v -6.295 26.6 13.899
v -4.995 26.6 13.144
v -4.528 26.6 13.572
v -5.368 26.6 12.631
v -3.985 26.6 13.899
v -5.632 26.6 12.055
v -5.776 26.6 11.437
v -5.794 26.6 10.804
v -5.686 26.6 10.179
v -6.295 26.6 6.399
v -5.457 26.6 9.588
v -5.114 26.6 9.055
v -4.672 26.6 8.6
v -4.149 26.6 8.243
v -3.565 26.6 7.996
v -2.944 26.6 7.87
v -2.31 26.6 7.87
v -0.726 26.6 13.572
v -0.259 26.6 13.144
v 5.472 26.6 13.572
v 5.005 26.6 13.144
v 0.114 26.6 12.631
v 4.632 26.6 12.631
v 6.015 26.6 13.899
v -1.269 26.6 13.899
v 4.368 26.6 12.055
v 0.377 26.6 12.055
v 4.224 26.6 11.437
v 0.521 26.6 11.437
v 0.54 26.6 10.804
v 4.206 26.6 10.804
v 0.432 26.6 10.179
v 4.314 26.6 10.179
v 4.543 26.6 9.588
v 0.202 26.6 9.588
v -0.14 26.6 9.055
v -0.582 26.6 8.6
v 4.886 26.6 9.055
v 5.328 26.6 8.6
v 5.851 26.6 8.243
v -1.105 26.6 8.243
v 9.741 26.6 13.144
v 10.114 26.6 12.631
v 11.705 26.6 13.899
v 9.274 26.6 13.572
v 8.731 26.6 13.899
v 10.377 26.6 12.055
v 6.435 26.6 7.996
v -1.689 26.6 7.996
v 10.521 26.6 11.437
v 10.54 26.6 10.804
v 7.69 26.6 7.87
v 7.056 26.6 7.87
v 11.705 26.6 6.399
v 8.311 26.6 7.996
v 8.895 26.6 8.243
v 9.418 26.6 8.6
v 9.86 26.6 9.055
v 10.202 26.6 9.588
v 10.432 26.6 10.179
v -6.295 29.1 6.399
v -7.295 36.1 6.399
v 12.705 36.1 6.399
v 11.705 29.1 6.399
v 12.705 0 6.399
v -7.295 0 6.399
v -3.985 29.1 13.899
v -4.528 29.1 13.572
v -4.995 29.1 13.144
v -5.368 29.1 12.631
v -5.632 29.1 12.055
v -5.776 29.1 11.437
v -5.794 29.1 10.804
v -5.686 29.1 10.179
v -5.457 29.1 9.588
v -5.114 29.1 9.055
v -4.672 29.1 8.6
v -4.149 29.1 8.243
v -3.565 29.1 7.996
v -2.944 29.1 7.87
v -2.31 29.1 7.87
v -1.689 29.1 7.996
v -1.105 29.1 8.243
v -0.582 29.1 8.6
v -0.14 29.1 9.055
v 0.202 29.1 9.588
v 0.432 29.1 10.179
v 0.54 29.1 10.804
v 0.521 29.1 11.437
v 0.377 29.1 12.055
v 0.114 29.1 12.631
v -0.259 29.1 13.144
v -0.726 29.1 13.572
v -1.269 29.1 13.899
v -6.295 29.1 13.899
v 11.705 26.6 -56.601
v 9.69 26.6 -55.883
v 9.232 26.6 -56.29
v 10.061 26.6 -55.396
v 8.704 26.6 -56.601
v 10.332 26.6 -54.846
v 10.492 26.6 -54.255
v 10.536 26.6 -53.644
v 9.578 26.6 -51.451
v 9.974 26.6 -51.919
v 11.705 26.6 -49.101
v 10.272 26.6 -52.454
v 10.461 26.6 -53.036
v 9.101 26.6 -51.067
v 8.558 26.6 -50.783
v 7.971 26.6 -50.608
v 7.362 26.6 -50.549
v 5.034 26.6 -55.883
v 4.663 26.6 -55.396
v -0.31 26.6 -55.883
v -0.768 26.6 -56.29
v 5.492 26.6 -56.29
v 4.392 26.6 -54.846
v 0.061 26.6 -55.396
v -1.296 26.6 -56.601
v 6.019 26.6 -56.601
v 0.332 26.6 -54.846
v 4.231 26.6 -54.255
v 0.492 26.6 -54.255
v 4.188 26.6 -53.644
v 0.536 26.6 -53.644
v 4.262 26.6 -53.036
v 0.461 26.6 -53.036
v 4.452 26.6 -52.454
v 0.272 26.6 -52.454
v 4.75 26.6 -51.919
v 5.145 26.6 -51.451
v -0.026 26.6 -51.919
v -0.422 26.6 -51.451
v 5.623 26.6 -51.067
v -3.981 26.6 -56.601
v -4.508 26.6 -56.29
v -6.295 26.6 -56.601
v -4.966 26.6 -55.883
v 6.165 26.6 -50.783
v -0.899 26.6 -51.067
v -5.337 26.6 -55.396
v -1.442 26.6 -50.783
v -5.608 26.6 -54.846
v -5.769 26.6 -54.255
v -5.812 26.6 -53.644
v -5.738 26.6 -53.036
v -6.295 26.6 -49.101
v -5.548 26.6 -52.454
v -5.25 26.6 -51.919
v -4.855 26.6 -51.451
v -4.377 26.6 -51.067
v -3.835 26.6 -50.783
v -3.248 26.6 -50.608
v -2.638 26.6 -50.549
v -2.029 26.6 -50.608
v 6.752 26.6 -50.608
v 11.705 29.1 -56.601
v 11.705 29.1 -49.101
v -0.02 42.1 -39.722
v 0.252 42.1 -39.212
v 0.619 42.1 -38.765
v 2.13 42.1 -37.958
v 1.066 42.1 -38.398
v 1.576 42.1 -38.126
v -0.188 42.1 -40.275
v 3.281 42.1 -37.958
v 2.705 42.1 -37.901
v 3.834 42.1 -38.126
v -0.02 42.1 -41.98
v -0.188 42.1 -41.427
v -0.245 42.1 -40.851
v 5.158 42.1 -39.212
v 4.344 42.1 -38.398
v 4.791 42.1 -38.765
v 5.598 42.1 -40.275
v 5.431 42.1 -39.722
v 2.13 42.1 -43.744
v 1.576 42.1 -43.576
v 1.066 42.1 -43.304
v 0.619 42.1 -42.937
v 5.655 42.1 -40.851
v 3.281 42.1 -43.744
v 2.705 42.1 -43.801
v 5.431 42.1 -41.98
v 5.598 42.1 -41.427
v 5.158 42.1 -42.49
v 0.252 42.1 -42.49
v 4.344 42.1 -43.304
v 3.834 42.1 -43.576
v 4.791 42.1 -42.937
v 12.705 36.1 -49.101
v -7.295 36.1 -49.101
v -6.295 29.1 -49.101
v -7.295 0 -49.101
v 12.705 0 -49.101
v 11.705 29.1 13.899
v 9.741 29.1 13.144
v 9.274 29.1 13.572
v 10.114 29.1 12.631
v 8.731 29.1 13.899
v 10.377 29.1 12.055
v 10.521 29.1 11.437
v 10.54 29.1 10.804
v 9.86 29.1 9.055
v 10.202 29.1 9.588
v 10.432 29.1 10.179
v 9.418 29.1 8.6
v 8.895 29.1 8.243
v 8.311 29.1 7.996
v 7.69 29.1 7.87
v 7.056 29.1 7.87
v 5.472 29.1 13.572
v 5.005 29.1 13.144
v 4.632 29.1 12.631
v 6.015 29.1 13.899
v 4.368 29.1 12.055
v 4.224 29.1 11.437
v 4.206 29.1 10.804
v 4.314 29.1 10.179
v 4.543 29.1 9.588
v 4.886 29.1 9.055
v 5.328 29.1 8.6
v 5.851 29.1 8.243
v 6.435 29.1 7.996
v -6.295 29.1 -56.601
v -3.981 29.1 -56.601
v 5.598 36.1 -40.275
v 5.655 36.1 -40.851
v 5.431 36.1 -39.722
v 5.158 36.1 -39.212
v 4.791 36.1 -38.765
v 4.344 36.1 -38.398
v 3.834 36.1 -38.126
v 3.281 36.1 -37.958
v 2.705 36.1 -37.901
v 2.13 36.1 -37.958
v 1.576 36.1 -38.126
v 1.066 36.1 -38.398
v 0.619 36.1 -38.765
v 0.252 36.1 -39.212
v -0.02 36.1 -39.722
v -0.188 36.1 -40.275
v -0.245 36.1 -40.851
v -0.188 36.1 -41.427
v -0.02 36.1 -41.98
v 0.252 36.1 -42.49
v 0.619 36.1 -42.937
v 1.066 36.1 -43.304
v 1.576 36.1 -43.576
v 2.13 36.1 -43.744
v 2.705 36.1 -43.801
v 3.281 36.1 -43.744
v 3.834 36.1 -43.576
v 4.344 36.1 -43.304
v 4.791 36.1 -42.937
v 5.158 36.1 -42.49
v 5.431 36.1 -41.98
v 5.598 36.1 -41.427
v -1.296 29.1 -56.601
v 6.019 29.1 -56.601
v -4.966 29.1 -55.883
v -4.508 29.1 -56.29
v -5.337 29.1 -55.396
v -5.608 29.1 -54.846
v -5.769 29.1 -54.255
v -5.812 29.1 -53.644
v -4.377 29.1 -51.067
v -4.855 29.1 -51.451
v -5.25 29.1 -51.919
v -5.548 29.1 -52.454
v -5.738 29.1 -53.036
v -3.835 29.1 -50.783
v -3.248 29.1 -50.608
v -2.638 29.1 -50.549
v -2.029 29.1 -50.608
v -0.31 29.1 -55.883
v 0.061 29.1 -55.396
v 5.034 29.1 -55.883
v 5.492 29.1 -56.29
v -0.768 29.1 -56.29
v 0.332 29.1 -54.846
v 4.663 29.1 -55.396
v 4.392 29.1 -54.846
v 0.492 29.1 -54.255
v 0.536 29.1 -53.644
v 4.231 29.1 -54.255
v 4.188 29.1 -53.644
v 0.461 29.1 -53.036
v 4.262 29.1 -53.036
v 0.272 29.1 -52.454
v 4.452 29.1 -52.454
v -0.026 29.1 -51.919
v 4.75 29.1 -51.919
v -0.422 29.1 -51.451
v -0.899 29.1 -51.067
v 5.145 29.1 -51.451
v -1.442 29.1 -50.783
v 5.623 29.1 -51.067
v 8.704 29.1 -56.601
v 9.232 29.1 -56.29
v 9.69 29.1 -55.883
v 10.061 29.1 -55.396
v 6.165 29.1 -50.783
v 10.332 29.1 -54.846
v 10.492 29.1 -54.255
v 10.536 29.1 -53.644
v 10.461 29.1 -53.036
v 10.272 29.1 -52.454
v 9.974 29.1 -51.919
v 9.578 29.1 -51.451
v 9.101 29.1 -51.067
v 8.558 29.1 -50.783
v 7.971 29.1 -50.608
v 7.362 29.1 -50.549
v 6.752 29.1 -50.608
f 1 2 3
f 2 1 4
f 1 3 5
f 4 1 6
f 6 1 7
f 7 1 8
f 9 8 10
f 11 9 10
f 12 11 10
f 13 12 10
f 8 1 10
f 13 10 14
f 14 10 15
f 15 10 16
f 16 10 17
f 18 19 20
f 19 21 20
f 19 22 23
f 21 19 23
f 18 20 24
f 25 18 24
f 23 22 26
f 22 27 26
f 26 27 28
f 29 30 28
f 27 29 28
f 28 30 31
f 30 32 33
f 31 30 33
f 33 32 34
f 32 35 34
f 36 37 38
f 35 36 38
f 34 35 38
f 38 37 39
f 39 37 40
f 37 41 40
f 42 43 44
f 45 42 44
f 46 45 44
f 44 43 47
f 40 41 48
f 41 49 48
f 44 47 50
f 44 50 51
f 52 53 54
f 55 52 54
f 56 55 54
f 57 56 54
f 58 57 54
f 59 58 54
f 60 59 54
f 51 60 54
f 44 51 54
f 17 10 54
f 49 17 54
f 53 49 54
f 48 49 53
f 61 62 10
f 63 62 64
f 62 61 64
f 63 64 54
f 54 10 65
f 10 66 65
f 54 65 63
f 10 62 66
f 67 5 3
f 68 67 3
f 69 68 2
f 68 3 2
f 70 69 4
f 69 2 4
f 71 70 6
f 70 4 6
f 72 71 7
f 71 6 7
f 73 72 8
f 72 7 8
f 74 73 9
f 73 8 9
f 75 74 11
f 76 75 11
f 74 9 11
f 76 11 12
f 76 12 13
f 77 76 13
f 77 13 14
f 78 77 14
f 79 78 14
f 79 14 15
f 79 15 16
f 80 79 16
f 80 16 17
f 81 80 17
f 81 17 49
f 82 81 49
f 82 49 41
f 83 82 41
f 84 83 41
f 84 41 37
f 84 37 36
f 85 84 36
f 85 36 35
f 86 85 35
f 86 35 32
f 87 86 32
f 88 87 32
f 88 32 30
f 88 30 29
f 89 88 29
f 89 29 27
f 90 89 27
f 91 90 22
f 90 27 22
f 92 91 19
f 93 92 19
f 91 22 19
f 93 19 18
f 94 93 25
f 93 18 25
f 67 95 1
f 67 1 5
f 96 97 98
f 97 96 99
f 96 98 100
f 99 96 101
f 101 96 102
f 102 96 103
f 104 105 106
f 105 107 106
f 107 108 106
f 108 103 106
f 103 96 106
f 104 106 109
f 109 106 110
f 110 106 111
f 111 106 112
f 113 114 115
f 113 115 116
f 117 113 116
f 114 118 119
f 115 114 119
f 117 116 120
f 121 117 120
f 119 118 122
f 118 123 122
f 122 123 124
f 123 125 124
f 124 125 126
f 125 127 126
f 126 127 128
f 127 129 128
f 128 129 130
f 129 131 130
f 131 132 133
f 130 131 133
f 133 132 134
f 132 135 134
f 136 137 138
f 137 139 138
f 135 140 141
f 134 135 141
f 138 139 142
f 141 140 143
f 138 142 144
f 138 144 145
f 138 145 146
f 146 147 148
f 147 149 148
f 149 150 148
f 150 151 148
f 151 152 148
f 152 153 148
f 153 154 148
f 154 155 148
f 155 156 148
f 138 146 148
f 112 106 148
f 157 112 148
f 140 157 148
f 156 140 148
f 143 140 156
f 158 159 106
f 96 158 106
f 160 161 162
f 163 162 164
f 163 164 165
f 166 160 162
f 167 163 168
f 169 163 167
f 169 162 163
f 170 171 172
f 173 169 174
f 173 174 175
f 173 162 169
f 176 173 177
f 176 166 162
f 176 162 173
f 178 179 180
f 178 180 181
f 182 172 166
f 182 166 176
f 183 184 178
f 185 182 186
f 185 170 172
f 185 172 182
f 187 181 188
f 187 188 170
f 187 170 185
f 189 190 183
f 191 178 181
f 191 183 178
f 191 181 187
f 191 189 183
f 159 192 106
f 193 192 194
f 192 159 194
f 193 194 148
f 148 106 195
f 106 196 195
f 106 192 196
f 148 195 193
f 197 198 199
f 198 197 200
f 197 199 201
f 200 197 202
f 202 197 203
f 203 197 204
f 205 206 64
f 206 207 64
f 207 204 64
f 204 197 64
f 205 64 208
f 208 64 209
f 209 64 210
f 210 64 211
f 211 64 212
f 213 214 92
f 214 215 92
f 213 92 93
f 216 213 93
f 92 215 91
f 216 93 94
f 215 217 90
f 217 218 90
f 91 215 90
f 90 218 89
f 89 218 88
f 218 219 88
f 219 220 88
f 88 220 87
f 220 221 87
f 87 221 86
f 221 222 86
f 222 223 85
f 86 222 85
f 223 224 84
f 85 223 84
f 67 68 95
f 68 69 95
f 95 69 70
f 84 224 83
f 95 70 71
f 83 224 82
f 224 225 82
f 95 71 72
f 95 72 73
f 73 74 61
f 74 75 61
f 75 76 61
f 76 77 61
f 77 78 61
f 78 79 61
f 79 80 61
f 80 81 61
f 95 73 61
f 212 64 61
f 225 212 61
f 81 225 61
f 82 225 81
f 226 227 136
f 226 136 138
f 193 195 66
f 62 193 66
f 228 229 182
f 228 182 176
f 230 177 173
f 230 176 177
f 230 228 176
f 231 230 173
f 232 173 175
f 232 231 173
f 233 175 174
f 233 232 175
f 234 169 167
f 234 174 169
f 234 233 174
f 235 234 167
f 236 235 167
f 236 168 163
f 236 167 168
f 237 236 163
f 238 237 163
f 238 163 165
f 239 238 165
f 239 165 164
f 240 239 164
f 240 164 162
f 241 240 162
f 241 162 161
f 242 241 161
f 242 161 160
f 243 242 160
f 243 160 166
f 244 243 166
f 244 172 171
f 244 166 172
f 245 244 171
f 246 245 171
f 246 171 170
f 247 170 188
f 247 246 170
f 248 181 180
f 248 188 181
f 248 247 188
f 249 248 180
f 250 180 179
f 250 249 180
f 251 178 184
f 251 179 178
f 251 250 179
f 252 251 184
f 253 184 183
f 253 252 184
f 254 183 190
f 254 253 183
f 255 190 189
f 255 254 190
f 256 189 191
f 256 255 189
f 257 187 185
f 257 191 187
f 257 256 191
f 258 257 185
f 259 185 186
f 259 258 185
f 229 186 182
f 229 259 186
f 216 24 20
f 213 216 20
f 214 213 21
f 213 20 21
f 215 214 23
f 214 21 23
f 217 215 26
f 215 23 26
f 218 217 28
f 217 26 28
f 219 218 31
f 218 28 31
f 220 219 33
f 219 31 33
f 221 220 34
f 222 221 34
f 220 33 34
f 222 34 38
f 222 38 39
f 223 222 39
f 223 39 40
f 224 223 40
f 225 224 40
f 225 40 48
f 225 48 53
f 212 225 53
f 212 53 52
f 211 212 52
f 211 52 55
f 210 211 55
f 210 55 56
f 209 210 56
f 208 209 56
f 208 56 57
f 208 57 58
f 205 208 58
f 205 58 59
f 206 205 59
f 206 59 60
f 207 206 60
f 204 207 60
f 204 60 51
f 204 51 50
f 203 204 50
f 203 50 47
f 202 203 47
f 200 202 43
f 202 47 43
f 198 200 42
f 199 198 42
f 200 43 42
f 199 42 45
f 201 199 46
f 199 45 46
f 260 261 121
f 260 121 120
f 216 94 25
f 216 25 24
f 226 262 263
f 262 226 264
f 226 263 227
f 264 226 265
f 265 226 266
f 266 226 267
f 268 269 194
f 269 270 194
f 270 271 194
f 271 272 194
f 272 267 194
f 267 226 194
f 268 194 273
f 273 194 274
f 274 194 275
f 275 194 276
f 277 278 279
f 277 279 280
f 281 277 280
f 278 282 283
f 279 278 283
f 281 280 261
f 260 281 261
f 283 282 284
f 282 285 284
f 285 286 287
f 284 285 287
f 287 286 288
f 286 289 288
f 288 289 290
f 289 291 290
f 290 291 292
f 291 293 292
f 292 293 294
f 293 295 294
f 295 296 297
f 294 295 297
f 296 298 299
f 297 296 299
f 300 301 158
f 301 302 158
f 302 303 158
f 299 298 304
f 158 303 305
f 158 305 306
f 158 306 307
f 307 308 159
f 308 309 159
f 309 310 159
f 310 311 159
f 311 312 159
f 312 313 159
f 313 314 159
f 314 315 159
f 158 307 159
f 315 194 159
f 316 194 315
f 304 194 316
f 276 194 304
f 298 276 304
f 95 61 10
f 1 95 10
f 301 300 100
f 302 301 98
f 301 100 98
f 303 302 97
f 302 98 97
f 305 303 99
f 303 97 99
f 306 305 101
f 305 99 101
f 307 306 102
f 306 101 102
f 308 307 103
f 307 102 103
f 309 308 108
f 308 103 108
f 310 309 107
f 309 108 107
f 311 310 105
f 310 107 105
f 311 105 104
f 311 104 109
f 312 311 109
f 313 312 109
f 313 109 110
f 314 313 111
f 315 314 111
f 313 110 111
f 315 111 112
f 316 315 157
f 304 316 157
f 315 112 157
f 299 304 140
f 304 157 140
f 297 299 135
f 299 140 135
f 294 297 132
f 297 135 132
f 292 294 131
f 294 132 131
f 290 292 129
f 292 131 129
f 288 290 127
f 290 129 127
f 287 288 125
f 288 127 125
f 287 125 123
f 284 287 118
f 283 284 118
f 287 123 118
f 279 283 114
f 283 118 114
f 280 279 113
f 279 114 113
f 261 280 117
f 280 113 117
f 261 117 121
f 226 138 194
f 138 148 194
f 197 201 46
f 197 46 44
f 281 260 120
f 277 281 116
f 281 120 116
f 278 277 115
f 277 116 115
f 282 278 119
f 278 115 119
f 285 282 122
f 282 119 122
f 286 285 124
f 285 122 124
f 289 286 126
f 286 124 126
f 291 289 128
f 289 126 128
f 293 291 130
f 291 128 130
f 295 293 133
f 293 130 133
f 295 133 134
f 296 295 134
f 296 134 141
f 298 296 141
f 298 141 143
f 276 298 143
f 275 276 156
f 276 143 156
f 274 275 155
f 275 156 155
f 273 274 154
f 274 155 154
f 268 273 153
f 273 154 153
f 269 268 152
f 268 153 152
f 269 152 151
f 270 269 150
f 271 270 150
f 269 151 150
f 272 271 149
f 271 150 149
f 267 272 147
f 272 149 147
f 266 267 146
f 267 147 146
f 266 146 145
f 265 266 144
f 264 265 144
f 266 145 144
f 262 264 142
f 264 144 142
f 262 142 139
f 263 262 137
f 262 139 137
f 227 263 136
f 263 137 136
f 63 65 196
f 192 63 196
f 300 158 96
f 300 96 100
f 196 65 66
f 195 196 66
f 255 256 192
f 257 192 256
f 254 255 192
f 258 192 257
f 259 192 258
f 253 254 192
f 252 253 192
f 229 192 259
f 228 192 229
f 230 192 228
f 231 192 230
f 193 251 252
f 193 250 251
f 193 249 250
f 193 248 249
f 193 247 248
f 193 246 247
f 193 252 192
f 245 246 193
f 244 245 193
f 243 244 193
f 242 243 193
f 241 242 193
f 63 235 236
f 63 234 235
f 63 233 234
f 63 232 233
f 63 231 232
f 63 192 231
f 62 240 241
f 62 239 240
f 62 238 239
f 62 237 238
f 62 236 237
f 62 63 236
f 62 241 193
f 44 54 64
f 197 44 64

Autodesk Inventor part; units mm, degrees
ref_plane "YZ Plane" through (0, 0, 0) normal (1, 0, 0) x (0, 1, 0)
ref_plane "XZ Plane" through (0, 0, 0) normal (0, 1, 0) x (-1, 0, 0)
ref_plane "XY Plane" through (0, 0, 0) normal (0, 0, 1) x (1, 0, 0)
sketch "Sketch5" plane through (0, 0, 0) normal (1, 0, 0) x (0, 1, 0)
  point P0 (0, 0)
sketch "Sketch6" plane through (0, 0, 0) normal (0, 1, 0) x (-1, 0, 0)
  line L0 (7.2949, 6.399) -> (-12.7051, 6.399)
  line L1 (-12.7051, 6.399) -> (-12.7051, -49.101)
  line L2 (-12.7051, -49.101) -> (7.2949, -49.101)
  line L3 (7.2949, -49.101) -> (7.2949, 6.399)
  point P0 (0, 0)
  dimension "d18" = 20
  dimension "d19" = 55.5
extrude "Extrusion4" add sketch "Sketch6" along normal blind 36.1
sketch "Sketch7" plane through (-7.2949, 0, 6.399) normal (0, 0, 1) x (1, 0, 0)
  line L0 (0, 0) -> (0, 36.1) projected
  line L1 (20, 0) -> (20, 36.1) projected
  line L2 (1, 26.6) -> (19, 26.6)
  line L3 (19, 26.6) -> (19, 29.1)
  line L4 (19, 29.1) -> (1, 29.1)
  line L5 (1, 29.1) -> (1, 26.6)
  point P0 (7.2949, 0)
  dimension "d25" = 2.5
extrude "Extrusion5" add sketch "Sketch7" along normal blind 7.5
sketch "Sketch8" plane through (12.7051, 0, -49.101) normal (0, 0, -1) x (-1, 0, 0)
  line L0 (0, 0) -> (0, 36.1) projected
  line L1 (1, 26.6) -> (19, 26.6) projected
  line L2 (1, 26.6) -> (19, 26.6)
  line L3 (19, 26.6) -> (19, 29.1) projected
  line L4 (19, 26.6) -> (19, 29.1)
  line L5 (19, 29.1) -> (1, 29.1) projected
  line L6 (19, 29.1) -> (1, 29.1)
  line L7 (1, 29.1) -> (1, 26.6) projected
  line L8 (1, 29.1) -> (1, 26.6)
  point P0 (12.7051, 0)
extrude "Extrusion6" add sketch "Sketch8" along normal blind 7.5
sketch "Sketch9" plane through (0, 36.1, 0) normal (0, 1, 0) x (1, 0, 0)
  line L0 (12.7051, -6.399) -> (12.7051, 49.101) projected
  line L1 (-7.2949, 49.101) -> (-7.2949, -6.399) projected
  circle A0 centre (2.7051, 40.851) radius 2.95
  line L2 (12.7051, 49.101) -> (-7.2949, 49.101) projected
  point P0 (0, 0)
  dimension "d35" = 5.9
  dimension "d39" = 10
  dimension "d40" = 8.25
extrude "Extrusion7" add sketch "Sketch9" along normal blind 6
sketch "Sketch11" plane through (-6.2949, 29.1, 6.399) normal (0, 1, 0) x (1, 0, 0)
  line L0 (-1, 0) -> (19, 0) projected
  line L1 (10, -4) -> (10, 0)
  line L2 (8, -4) -> (8, 0)
  line L3 (10, -4) -> (8, -4)
  line L4 (18, 0) -> (18, -7.5) projected
  circle A0 centre (13.6676, -4.63) radius 2.25
  circle A1 centre (3.6676, -4.63) radius 2.25
  point P0 (6.2949, 6.399)
  point P1 (0, -7.5)
  dimension "d48" = 4.5
  dimension "d50" = 4.5
hole "Hole1" at (-2.6273, 29.1, 11.029) at (7.3727, 29.1, 11.029) direction (0, -1, 0) diameter 6.35 end through all
sketch "Sketch15" plane through (-6.2949, 29.1, -49.101) normal (0, 1, 0) x (1, 0, 0)
  circle A0 centre (13.6566, 4.6228) radius 2.25
  circle A1 centre (3.6566, 4.6228) radius 2.25
  point P0 (6.2949, -49.101)
  point P1 (18, 0)
  dimension "d64" = 4.5
  dimension "d66" = 4.5
hole "Hole2" at (-2.6383, 29.1, -53.7238) at (7.3617, 29.1, -53.7238) direction (0, -1, 0) diameter 6.35 end through all
properties part number "Serial Motor"
